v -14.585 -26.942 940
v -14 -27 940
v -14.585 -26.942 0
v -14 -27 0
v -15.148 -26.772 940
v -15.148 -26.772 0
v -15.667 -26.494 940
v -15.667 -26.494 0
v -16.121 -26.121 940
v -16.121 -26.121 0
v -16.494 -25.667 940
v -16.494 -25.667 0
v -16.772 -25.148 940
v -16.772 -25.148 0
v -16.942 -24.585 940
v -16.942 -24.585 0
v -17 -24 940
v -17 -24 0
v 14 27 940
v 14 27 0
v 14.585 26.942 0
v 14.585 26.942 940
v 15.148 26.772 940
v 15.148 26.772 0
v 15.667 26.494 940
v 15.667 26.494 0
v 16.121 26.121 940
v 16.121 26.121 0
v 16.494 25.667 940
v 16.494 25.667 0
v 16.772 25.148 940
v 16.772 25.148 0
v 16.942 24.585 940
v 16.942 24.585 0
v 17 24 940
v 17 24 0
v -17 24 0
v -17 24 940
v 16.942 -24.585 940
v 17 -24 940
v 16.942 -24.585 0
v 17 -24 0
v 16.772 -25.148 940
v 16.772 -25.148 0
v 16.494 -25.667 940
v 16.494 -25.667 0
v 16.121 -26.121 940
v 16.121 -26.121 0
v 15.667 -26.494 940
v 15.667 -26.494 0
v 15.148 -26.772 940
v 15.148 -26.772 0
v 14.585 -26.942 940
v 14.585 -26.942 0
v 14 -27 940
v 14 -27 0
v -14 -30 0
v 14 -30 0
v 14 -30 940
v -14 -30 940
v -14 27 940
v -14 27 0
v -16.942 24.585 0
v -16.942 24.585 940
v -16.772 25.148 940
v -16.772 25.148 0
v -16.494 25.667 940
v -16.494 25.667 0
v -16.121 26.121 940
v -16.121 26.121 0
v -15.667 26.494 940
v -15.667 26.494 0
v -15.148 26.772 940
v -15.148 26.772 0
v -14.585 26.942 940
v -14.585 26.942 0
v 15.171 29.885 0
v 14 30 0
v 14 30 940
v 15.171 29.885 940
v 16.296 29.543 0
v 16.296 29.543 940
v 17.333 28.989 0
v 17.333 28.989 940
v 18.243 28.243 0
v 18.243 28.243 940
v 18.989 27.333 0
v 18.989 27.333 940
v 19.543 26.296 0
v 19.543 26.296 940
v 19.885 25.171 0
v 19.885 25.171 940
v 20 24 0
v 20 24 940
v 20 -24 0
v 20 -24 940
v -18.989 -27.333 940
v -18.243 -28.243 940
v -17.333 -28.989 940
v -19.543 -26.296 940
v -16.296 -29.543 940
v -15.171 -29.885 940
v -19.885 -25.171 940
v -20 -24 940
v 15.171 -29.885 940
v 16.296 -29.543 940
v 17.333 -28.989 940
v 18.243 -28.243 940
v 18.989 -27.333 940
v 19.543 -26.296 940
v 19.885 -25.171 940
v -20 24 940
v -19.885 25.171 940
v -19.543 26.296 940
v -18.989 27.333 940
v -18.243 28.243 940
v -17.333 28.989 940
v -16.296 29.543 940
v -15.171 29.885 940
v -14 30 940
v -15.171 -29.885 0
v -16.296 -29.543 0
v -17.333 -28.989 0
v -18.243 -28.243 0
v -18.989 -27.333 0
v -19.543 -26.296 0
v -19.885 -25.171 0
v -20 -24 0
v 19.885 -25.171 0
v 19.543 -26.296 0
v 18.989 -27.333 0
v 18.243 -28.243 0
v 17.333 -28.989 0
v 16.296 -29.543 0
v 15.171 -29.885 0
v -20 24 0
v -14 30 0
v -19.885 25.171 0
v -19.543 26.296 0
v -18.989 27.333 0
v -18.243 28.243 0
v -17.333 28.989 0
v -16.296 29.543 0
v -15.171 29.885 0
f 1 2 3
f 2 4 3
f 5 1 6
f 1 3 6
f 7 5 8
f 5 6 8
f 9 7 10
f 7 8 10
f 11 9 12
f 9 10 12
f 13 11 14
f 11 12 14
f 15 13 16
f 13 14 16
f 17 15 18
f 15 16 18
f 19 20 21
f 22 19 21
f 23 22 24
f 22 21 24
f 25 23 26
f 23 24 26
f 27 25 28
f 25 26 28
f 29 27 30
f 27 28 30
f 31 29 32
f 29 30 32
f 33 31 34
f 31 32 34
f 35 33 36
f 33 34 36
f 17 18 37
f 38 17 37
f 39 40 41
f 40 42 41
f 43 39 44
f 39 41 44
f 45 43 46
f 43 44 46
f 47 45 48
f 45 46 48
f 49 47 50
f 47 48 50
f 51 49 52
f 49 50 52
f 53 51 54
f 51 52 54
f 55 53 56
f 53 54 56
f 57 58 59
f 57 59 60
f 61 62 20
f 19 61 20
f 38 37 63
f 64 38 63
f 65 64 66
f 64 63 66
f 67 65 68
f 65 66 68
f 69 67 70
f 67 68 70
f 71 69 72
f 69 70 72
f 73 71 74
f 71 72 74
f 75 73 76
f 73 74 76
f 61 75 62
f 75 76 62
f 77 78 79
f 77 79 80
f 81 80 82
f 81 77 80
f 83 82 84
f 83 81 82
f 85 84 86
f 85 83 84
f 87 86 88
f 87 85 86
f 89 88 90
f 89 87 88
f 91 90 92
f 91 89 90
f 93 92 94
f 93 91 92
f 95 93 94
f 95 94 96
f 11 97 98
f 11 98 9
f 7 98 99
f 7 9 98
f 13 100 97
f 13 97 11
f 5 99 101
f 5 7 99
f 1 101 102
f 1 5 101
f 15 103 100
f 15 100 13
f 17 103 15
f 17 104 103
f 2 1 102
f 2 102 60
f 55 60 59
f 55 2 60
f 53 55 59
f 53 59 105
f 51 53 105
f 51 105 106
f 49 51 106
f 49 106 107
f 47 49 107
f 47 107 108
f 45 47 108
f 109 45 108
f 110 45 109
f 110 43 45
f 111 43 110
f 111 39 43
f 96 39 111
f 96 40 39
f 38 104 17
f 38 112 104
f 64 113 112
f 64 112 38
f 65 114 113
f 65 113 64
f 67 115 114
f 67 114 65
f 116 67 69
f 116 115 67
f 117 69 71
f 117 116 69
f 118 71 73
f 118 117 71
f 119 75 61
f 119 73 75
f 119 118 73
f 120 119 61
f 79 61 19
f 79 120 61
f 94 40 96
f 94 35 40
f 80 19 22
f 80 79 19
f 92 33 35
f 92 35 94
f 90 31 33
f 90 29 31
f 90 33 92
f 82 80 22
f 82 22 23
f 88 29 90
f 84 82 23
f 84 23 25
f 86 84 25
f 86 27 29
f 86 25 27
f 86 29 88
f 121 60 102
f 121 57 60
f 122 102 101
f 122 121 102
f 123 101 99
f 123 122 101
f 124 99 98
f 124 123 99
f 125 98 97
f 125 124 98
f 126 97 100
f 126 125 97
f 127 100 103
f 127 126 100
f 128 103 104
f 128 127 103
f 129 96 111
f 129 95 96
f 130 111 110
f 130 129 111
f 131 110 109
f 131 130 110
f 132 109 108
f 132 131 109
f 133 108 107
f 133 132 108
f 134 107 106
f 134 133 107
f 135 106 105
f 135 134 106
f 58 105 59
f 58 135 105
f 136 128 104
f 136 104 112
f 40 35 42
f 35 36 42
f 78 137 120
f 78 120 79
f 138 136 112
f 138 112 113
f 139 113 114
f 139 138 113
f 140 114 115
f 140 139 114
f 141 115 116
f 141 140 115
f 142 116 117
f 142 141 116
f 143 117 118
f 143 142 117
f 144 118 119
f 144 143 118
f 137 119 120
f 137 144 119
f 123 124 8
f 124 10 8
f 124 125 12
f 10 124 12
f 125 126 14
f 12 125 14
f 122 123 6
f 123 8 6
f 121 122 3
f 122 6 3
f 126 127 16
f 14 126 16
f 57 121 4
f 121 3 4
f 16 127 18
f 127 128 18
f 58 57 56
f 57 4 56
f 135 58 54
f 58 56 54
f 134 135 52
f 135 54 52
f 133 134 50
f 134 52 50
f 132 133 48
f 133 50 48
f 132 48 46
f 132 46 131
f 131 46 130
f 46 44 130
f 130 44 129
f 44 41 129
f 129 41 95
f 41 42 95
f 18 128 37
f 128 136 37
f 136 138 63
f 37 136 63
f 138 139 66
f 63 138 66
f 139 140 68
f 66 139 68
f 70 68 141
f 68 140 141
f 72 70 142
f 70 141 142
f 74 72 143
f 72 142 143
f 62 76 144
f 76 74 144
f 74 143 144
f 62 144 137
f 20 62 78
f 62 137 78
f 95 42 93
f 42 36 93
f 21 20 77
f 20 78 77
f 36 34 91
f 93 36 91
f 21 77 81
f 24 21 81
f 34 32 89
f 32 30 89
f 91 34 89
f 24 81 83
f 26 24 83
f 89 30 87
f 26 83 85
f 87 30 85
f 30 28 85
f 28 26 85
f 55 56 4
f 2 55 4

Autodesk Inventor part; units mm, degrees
ref_plane "YZ Plane" through (0, 0, 0) normal (1, 0, 0) x (0, 1, 0)
ref_plane "Start Plane" through (0, 0, 0) normal (0, 0, 1) x (1, 0, 0)
ref_plane "End Plane" through (0, 0, 940) normal (0, 0, 1) x (1, 0, 0)
sketch "Sketch" plane through (0, 0, 0) normal (0, 0, 1) x (1, 0, 0)
  line L0 (-20, -24) -> (-20, 24)
  line L1 (-14, 30) -> (14, 30)
  line L2 (20, 24) -> (20, -24)
  line L3 (14, -30) -> (-14, -30)
  arc A0 (-20, -24) -> (-14, -30) centre (-14, -24) ccw
  arc A1 (20, 24) -> (14, 30) centre (14, 24) ccw
  arc A2 (-14, 30) -> (-20, 24) centre (-14, 24) ccw
  arc A3 (14, -30) -> (20, -24) centre (14, -24) ccw
  arc A4 (-14, 27) -> (-17, 24) centre (-14, 24) ccw
  line L4 (-14, 27) -> (14, 27)
  arc A5 (17, 24) -> (14, 27) centre (14, 24) ccw
  line L5 (17, 24) -> (17, -24)
  arc A6 (14, -27) -> (17, -24) centre (14, -24) ccw
  line L6 (14, -27) -> (-14, -27)
  arc A7 (-17, -24) -> (-14, -27) centre (-14, -24) ccw
  line L7 (-17, -24) -> (-17, 24)
  line L8 (0, 43.7397) -> (0, -43.7397) construction
  line L9 (-29.7397, 0) -> (29.7397, 0) construction
  dimension "d7" = 6
  dimension "d9" = 40
  dimension "d11" = 60
  dimension "d12" = 3
  dimension "d15" = 20
  dimension "d16" = 30
extrude "Body" add sketch "Sketch" along normal up to surface (940 mm away) from surface at 0
sketch "Sketch3" plane through (0, 0, 0) normal (0, 0, 1) x (1, 0, 0)
  line L0 (0, 0) -> (10, 0)
ref_plane "Work Plane3" through (0, 0, 0) normal (0, -1, 0) x (1, 0, 0)
sketch "Sketch4" plane through (0, 0, 0) normal (0, -1, 0) x (1, 0, 0)
  line L0 (-2, 0) -> (12, 0)
  line L1 (-2, 940) -> (12, 940)
  dimension "d18" = 940
equation "\"d7\" = G_IR"
equation "\"d9\" = G_W"
equation "\"d11\" = G_H"
equation "\"d12\" = G_T"
equation "\"d15\" = 0.5 * d9"
equation "\"d16\" = 0.5 * d11"
equation "\"d3\" = G_L"
equation "\"G_W\" = 40"
equation "\"G_H\" = 60"
equation "\"G_T\" = 3"
equation "\"G_IR\" = 6"
equation "\"G_L\" = d18"
equation "\"G_OFFSET_START\" = 0"
equation "\"G_OFFSET_END\" = 0"
properties part number "ISO 10799-2 - 60x40x3 - 940" material "Steel, Mild"
